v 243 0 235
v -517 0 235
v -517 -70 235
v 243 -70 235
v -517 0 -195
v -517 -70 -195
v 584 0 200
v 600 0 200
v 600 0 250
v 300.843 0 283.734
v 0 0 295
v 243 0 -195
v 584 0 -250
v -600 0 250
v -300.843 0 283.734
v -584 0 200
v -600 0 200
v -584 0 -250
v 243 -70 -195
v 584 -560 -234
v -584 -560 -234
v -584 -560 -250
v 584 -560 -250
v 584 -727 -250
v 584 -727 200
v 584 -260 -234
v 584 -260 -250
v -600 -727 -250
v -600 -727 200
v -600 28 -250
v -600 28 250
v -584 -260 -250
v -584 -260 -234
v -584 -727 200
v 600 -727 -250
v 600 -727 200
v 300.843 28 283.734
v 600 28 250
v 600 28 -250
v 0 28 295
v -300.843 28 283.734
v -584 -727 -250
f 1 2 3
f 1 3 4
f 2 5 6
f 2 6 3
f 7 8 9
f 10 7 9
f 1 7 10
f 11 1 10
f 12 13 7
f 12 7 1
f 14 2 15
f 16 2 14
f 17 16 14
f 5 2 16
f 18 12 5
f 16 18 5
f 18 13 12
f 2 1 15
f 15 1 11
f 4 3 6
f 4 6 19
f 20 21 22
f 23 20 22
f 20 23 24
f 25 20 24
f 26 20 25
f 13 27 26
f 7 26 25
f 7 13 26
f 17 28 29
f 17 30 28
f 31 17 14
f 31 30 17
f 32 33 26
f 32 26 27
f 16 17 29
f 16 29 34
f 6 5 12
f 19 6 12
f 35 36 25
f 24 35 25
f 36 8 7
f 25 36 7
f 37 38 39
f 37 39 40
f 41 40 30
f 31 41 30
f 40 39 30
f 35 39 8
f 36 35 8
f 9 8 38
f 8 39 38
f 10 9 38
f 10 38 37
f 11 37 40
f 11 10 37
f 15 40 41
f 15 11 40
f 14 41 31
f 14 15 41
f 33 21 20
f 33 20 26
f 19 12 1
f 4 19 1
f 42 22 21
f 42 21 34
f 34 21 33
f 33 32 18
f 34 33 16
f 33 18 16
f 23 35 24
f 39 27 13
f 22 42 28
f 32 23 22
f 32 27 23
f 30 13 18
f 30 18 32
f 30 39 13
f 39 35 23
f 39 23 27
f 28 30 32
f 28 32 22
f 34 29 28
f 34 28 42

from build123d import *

# Parameters (mm, degrees)
BOSS_EXTRUDE1_DEPTH = 28
SKETCH2_W           = 16
SKETCH2_H           = 450
BOSS_EXTRUDE2_DEPTH = 727
SKETCH3_W           = 16
SKETCH3_H           = 300
BOSS_EXTRUDE3_DEPTH = 1168
SKETCH4_W           = 760
SKETCH4_H           = 430
BOSS_EXTRUDE4_DEPTH = 70


with BuildPart() as part:
    # Sketch1 → Boss-Extrude1 (new body)
    with BuildSketch(Plane(origin=(0, 0, 0), x_dir=(1, 0, 0), z_dir=(0, 1, 0))):
        with BuildLine():
            Line((-600, -250), (-600, 250))
            Line((-600, 250), (600, 250))
            Line((600, 250), (600, -250))
            ThreePointArc((600, -250), (0, -295), (-600, -250))
        make_face()
    extrude(amount=BOSS_EXTRUDE1_DEPTH)

    # Sketch2 → Boss-Extrude2 (add)
    with BuildSketch(Plane.XZ):
        with Locations((-592, -25)):
            Rectangle(SKETCH2_W, SKETCH2_H)
    boss_extrude2 = extrude(amount=BOSS_EXTRUDE2_DEPTH)

    # Mirror1: Boss-Extrude2 across plane
    add(boss_extrude2.mirror(Plane(origin=(0, 0, 0), x_dir=(0, 0, 1), z_dir=(1, 0, 0))))

    # Sketch3 → Boss-Extrude3 (add)
    with BuildSketch(Plane(origin=(-584, 0, 0), x_dir=(0, 0, -1), z_dir=(1, 0, 0))):
        with Locations((242, -410)):
            Rectangle(SKETCH3_W, SKETCH3_H)
    extrude(amount=BOSS_EXTRUDE3_DEPTH)

    # Sketch4 → Boss-Extrude4 (add)
    with BuildSketch(Plane.XZ):
        with Locations((-137, 20)):
            Rectangle(SKETCH4_W, SKETCH4_H)
    extrude(amount=BOSS_EXTRUDE4_DEPTH)


solid = part.part
